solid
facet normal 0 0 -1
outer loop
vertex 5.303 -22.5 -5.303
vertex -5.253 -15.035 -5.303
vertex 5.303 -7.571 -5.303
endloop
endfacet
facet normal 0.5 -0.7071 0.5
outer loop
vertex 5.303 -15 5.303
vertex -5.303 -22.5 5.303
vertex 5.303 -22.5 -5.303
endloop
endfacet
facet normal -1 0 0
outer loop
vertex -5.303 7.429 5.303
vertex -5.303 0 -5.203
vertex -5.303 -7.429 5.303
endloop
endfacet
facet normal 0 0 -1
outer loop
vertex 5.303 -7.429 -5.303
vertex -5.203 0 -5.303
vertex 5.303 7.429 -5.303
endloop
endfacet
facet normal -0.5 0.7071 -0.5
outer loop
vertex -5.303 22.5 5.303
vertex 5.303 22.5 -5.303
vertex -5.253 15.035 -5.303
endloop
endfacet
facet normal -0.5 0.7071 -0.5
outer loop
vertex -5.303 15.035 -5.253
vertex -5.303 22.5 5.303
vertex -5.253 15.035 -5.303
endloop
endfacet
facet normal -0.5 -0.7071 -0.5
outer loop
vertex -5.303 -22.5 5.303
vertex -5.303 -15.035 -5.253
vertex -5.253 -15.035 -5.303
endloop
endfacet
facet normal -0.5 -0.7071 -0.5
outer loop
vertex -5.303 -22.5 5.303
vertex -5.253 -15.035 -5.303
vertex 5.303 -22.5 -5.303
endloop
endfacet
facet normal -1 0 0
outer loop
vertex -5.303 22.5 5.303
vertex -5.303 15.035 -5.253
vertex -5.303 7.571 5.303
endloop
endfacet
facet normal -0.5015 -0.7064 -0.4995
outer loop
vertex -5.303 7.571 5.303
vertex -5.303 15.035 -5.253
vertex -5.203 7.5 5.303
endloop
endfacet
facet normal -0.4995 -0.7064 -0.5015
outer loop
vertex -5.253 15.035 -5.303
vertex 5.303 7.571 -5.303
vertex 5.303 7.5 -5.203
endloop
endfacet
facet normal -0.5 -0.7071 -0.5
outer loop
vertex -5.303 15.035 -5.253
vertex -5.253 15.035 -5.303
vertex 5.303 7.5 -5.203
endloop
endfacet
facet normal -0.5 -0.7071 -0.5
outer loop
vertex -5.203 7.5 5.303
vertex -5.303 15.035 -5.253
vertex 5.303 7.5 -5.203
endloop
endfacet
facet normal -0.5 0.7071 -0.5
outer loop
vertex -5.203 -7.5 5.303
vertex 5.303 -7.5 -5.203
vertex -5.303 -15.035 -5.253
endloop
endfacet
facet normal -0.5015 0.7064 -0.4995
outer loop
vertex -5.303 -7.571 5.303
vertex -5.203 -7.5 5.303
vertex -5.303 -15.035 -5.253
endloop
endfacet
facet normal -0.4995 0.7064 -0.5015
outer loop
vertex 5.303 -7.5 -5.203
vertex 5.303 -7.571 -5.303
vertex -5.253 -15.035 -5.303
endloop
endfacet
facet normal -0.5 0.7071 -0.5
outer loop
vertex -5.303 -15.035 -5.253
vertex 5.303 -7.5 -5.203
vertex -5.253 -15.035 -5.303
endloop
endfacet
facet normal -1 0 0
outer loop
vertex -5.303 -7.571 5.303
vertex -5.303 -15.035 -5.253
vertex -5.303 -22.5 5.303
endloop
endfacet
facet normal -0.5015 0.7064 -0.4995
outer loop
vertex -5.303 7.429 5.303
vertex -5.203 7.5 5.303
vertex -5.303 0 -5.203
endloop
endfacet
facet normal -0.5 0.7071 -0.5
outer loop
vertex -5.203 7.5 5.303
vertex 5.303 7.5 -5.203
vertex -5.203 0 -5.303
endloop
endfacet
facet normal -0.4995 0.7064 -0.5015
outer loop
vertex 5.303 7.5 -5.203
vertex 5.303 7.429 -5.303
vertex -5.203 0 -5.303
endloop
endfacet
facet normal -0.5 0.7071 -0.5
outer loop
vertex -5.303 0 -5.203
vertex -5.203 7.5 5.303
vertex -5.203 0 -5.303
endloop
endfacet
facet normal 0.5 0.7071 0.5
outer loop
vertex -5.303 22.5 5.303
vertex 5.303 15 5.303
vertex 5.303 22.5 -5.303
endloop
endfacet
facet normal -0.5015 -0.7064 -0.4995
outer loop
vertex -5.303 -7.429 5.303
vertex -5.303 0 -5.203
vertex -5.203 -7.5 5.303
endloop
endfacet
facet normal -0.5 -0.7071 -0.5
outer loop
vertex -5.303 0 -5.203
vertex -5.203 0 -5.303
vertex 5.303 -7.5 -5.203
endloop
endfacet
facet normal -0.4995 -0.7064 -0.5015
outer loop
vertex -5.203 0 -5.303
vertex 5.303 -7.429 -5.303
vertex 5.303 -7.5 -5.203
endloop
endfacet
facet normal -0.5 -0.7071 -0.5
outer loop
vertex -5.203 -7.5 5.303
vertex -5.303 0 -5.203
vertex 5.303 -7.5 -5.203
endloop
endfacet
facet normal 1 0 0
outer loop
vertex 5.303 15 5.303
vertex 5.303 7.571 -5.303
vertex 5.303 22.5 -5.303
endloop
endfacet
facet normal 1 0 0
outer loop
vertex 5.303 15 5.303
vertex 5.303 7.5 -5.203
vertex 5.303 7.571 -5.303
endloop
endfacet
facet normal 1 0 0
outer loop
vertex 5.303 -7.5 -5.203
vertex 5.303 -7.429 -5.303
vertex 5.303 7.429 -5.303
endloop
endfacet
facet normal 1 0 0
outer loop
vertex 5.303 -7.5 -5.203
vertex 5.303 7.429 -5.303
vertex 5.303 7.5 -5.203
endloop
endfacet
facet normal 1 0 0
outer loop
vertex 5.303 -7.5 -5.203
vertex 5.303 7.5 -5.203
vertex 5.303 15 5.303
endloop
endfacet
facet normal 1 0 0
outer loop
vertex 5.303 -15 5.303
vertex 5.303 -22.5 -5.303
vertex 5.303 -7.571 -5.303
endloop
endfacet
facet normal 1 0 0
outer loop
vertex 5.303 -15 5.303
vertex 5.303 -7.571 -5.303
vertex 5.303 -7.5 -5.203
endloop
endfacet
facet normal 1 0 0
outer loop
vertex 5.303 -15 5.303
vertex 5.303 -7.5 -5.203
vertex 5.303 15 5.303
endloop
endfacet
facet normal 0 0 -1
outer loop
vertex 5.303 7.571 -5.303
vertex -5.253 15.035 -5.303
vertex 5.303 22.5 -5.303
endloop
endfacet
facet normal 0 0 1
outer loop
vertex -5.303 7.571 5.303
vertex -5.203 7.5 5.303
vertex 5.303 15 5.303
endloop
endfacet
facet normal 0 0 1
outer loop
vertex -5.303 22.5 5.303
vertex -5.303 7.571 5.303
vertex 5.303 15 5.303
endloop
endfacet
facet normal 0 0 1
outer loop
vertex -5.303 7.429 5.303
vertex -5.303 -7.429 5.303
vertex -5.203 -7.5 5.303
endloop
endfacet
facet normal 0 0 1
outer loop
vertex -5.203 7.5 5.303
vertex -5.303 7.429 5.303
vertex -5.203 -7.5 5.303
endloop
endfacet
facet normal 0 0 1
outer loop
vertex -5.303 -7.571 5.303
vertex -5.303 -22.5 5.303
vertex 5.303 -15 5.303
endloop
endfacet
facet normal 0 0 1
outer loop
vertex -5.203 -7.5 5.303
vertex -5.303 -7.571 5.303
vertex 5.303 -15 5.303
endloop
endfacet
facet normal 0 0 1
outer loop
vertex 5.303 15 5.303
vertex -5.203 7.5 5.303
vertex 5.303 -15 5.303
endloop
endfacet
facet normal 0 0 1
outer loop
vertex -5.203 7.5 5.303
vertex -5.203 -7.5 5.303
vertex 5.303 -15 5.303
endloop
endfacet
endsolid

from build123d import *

# Parameters (mm, degrees)
F0_W     = 10.6066017178
F0_H     = 10.6066017178
F1_DEPTH = 22.5
F4_DEPTH = 15
F6_DEPTH = 15
F8_DEPTH = 15


# Not quite as in the source:
# - a feature names something its author has since deleted; it is built from what else it names


with BuildPart() as f1:
    # F0 (on Front) → F1 (new body, symmetric)
    with BuildSketch(Plane.XZ):
        Rectangle(F0_W, F0_H)
    extrude(amount=F1_DEPTH, both=True)

    # F3 (on 3pt) → F4 (cut, symmetric)
    with BuildSketch(Plane(origin=(0, 0, 0), x_dir=(0, 1, 0), z_dir=(0.7071067812, 0, -0.7071067812))):
        Polygon((-15, -7.5), (-22.5, 0), (-15, 7.5), (-15, 9.5), (-24.5, 9.5), (-24.5, -9.5), (-15, -9.5), align=None)
        Polygon((15, 7.5), (22.5, 0), (15, -7.5), (15, -9.5), (24.5, -9.5), (24.5, 9.5), (15, 9.5), align=None)
    extrude(amount=F4_DEPTH, both=True, mode=Mode.SUBTRACT)

    # F5 (on 3pt) → F6 (cut, symmetric)
    with BuildSketch(Plane(origin=(0, 0, 0), x_dir=(0, 1, 0), z_dir=(0.7071067812, 0, -0.7071067812))):
        Polygon((7.5, 0), (0, -7.5), (-7.5, 0), (-15, -7.5), (-15, -9.5), (15, -9.5), (15, -7.5), align=None)
    extrude(amount=F6_DEPTH, both=True, mode=Mode.SUBTRACT)

    # F7 (on 3pt) → F8 (cut, symmetric)
    with BuildSketch(Plane(origin=(0, 0, 0), x_dir=(0, 1, 0), z_dir=(0.7071067812, 0, -0.7071067812))):
        Polygon((-7.5, 0.0707106781), (-16.0707106781, -8.5), (16.0707106781, -8.5), (7.5, 0.0707106781), (0, -7.4292893219), align=None)
    extrude(amount=F8_DEPTH, both=True, mode=Mode.SUBTRACT)


solid = f1.part
